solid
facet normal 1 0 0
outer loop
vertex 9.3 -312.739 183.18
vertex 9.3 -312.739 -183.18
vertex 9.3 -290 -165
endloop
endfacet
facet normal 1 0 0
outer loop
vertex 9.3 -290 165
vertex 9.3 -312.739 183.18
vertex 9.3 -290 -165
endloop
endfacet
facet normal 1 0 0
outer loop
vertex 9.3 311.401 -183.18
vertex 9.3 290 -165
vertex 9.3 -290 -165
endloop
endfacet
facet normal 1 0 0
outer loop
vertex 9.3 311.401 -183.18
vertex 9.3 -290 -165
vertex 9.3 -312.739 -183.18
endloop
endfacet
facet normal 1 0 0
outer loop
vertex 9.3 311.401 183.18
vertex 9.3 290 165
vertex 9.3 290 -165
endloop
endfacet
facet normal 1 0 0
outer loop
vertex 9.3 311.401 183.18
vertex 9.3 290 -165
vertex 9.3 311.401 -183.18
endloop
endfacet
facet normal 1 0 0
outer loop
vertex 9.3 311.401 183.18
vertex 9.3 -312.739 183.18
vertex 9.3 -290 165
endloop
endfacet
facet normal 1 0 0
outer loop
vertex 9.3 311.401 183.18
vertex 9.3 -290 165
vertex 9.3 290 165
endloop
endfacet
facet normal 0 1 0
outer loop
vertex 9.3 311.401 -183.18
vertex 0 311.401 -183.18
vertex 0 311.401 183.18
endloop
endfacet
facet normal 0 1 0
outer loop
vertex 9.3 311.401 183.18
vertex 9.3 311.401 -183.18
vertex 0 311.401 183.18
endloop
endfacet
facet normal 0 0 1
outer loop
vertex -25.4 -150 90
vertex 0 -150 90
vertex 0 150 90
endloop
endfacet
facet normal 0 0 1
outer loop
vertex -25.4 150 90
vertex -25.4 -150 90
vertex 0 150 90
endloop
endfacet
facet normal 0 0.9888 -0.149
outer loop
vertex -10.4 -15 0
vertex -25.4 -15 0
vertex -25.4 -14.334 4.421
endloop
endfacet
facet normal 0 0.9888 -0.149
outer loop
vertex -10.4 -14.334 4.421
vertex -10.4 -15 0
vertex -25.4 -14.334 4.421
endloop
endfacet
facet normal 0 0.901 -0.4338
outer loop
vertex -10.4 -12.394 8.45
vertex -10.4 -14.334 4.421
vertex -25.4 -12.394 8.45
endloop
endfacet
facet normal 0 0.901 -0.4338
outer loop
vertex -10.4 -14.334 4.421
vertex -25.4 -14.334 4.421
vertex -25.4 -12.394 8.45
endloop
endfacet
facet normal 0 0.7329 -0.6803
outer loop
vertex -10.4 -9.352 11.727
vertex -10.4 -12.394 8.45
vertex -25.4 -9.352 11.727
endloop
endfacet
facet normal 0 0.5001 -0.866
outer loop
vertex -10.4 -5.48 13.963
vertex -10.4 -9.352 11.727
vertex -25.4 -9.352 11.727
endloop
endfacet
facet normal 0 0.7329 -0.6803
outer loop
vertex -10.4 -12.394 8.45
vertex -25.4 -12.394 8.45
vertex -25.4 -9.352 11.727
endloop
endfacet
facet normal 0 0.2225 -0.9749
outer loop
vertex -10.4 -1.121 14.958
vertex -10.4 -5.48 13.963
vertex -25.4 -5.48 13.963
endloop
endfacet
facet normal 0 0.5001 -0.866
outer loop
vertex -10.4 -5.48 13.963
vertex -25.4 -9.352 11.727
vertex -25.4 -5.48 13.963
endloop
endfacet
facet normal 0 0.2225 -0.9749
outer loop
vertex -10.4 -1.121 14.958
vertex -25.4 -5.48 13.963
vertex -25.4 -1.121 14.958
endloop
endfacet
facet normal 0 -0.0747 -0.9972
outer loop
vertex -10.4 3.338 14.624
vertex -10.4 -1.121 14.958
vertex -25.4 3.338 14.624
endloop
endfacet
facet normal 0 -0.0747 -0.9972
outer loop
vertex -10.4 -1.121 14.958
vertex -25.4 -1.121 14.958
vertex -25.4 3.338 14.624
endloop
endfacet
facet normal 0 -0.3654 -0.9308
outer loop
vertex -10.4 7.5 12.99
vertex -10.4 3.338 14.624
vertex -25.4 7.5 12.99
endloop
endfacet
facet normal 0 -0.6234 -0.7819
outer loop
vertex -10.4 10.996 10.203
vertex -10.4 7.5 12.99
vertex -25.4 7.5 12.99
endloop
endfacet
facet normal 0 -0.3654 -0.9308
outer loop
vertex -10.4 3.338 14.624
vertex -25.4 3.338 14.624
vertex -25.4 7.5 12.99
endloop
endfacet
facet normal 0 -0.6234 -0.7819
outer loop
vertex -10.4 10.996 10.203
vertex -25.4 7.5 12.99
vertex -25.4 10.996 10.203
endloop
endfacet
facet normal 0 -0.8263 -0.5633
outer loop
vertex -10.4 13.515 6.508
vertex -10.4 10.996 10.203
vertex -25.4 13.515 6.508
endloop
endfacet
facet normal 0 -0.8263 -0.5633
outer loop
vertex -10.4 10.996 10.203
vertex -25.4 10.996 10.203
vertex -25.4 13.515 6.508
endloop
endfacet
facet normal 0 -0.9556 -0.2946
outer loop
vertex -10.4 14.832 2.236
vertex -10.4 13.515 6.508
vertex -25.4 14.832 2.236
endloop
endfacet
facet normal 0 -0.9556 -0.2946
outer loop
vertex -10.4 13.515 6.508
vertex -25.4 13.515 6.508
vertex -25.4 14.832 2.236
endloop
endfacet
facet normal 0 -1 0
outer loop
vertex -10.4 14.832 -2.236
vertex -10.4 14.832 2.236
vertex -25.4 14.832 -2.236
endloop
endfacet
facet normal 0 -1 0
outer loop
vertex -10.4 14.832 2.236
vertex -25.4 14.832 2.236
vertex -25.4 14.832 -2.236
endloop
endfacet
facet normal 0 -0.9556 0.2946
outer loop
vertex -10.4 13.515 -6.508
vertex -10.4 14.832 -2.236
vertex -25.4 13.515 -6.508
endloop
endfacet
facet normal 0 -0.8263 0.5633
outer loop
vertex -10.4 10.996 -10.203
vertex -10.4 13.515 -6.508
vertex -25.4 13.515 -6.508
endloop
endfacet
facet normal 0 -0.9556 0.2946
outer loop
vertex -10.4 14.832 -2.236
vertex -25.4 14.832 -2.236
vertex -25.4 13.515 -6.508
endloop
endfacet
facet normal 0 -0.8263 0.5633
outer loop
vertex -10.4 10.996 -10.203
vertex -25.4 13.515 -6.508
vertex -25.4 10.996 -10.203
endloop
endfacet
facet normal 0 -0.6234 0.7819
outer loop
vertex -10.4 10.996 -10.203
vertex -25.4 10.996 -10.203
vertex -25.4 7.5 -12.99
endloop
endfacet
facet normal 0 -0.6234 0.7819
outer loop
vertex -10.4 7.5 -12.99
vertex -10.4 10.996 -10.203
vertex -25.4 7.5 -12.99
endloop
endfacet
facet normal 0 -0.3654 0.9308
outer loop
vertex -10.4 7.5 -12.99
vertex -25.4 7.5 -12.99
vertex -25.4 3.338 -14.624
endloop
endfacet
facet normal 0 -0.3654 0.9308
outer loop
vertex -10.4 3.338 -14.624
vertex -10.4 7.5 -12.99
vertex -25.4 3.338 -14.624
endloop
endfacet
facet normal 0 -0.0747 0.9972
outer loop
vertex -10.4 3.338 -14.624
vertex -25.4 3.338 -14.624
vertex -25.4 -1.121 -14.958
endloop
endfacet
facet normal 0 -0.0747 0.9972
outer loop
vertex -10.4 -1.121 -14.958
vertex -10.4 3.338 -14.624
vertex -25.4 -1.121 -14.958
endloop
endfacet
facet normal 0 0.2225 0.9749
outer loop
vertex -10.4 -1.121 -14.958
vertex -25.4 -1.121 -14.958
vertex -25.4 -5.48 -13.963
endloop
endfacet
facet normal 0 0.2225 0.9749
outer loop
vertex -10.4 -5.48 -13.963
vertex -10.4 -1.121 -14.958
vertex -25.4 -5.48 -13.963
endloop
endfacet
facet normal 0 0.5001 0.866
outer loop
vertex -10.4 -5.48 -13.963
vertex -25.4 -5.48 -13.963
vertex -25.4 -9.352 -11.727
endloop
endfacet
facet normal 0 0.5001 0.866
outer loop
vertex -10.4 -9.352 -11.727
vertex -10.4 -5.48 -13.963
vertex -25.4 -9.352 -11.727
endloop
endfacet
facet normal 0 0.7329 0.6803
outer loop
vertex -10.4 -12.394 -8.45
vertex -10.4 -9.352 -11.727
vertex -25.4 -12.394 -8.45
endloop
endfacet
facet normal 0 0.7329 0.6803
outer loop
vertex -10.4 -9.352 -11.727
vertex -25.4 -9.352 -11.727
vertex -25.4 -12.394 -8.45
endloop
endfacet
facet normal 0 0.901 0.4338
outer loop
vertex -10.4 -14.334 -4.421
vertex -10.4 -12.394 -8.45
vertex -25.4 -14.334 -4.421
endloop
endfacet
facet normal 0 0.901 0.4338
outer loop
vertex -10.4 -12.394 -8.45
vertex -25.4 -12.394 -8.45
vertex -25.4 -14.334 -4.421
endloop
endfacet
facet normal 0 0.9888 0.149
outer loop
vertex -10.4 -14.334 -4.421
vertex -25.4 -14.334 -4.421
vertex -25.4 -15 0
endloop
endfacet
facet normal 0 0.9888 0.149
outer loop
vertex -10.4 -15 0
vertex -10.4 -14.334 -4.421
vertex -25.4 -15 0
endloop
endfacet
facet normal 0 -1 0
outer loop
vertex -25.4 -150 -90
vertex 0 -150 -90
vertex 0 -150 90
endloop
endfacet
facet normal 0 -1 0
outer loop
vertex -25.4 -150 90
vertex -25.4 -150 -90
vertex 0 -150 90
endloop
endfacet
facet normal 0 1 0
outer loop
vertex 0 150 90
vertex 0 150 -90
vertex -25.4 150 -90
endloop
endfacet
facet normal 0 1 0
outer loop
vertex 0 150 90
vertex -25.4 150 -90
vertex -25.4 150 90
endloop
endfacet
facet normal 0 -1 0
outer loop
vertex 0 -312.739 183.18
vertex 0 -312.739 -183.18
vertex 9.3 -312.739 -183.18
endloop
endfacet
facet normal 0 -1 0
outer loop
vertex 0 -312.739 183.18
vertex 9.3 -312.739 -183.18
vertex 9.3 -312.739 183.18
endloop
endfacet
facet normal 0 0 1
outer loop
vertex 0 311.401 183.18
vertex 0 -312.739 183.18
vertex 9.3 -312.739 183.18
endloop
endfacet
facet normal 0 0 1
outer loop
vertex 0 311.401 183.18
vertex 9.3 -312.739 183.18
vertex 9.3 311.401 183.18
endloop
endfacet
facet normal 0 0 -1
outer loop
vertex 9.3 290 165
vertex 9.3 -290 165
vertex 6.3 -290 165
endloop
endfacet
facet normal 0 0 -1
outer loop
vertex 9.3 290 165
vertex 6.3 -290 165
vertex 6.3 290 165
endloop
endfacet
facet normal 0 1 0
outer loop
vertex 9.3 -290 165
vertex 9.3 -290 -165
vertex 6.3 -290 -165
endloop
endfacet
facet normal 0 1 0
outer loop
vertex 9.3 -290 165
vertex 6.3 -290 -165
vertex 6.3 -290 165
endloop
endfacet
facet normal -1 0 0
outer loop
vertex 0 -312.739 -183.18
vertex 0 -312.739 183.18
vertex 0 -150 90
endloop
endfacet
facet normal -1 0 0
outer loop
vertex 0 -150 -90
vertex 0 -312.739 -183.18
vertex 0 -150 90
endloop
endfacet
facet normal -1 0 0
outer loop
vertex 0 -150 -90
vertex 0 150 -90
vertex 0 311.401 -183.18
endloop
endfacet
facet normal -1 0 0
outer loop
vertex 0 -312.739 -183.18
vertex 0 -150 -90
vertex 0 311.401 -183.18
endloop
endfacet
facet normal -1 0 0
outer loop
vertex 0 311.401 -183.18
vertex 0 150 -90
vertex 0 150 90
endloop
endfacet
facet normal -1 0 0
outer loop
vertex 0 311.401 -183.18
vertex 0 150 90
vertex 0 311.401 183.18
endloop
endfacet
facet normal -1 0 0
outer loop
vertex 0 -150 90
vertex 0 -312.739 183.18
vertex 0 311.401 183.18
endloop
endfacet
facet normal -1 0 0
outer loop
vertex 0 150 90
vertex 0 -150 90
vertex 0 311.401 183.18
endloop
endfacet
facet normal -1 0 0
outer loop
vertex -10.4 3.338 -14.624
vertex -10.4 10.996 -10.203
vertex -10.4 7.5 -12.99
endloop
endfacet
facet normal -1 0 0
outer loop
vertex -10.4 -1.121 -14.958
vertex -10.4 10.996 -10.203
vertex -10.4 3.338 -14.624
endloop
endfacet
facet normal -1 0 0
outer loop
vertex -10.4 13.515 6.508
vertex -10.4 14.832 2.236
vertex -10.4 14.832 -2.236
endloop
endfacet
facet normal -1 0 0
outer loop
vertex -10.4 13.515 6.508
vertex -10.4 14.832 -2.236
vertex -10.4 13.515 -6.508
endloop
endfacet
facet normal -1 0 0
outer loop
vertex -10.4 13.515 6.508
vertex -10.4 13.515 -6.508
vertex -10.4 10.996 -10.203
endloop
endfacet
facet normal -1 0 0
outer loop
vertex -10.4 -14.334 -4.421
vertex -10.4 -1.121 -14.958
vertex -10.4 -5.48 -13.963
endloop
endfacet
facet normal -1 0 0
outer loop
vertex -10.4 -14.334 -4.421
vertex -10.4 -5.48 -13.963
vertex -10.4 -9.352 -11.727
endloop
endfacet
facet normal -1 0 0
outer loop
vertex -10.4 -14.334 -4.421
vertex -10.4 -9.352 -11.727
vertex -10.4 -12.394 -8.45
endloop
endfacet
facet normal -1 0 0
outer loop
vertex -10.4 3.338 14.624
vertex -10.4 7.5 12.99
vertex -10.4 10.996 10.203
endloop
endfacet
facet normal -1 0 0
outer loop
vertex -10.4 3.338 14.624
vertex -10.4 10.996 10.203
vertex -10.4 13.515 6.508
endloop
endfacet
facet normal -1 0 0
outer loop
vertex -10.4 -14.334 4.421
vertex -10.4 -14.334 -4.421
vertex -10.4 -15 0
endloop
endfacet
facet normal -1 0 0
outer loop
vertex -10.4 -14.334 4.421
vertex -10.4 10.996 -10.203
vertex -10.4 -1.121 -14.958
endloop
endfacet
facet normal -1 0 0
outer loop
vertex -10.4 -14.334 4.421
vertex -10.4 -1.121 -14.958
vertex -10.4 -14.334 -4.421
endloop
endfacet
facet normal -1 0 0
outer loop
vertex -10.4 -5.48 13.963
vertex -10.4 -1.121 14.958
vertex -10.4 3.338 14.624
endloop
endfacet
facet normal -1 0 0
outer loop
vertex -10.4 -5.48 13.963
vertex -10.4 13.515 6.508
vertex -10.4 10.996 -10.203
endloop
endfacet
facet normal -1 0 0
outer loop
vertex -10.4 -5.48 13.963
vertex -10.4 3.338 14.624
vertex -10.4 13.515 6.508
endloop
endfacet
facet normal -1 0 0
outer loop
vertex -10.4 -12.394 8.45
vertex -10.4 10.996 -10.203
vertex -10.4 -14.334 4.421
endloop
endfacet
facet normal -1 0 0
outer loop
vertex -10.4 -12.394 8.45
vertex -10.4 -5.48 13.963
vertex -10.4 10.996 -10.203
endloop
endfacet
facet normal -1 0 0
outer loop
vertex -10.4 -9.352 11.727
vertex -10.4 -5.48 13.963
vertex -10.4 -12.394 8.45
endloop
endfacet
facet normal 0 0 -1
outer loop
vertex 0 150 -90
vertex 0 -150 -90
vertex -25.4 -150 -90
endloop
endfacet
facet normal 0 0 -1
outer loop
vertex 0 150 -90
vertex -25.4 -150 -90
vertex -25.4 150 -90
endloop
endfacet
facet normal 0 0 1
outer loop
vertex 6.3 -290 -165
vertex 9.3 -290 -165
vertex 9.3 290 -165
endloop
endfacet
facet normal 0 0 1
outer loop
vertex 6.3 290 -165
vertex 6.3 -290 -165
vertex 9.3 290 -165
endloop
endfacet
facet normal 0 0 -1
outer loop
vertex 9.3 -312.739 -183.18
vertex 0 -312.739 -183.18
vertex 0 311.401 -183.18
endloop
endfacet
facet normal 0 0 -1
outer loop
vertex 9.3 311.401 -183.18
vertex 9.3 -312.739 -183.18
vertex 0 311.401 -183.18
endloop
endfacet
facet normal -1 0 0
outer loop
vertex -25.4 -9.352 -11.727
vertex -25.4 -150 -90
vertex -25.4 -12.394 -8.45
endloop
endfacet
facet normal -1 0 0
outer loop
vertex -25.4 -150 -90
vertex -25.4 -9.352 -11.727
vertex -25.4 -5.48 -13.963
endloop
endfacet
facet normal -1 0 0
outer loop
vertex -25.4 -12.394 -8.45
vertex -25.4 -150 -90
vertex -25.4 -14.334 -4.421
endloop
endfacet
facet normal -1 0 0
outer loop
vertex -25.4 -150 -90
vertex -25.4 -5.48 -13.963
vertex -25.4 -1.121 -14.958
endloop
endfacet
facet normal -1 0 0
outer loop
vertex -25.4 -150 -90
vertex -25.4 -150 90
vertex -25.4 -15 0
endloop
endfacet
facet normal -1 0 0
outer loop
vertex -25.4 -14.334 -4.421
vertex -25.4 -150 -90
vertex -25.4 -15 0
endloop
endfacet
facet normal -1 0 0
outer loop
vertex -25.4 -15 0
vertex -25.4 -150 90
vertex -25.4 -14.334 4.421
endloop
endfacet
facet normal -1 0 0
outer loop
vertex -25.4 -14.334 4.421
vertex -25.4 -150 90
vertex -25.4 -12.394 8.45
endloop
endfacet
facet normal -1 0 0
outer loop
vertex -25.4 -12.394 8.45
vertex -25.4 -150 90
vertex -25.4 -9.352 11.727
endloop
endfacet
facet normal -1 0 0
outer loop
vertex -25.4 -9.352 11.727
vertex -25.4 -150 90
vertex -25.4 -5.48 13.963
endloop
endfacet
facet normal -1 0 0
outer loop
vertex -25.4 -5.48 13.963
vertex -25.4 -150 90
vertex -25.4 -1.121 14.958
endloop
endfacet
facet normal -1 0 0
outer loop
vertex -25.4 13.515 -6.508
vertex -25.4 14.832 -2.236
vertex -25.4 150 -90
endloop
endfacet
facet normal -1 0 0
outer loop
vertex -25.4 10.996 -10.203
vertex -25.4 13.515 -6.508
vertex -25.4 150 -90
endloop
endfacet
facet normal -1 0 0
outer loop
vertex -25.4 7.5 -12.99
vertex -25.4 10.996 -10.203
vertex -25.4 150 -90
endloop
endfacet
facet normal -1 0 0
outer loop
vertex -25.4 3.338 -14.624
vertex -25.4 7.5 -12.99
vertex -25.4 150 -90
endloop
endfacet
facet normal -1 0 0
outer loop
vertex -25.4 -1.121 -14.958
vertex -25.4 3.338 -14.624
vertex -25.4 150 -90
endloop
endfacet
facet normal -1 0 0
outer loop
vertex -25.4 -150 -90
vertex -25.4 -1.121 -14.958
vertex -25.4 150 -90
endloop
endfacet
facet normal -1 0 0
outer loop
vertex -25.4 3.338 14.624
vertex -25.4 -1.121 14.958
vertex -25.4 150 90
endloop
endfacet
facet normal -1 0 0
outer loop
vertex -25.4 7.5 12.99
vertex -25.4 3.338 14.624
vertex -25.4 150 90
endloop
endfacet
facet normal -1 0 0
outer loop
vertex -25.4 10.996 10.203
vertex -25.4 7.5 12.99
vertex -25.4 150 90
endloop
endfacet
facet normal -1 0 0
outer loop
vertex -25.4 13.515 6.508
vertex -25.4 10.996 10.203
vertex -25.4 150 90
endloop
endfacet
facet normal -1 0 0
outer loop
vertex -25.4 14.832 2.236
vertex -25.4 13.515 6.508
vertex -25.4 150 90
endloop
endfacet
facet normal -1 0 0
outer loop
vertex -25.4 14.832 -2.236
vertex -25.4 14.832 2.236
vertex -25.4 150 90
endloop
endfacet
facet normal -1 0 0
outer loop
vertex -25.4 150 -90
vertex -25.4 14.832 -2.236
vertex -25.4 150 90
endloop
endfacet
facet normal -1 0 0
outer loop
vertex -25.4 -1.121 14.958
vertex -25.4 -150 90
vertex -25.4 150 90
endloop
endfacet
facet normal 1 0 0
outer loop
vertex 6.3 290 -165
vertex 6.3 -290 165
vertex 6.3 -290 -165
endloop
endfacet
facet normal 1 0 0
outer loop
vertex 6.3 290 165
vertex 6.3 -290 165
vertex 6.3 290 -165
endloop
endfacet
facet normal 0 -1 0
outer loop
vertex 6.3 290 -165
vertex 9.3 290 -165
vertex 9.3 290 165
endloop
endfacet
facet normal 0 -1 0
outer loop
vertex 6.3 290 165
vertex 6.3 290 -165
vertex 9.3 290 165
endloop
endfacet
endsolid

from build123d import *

# Parameters (mm, degrees)
F0_W     = 624.14
F0_H     = 366.36
F1_DEPTH = 9.3
F2_W     = 580
F2_H     = 330
F3_DEPTH = 3
F4_W     = 300
F4_H     = 180
F5_DEPTH = 25.4
F6_R     = 15
F7_DEPTH = 15


with BuildPart() as f1:
    # F0 (on Right) → F1 (new body)
    with BuildSketch(Plane.YZ):
        with Locations((-0.668731, 0)):
            Rectangle(F0_W, F0_H)
    extrude(amount=F1_DEPTH)

    # F2 (on face) → F3 (cut)
    with BuildSketch(Plane.YZ.offset(9.3)):
        Rectangle(F2_W, F2_H)
    extrude(amount=-F3_DEPTH, mode=Mode.SUBTRACT)

    # F4 (on Right) → F5 (join)
    with BuildSketch(Plane.YZ):
        Rectangle(F4_W, F4_H)
    extrude(amount=-F5_DEPTH)

    # F6 (on face) → F7 (cut)
    with BuildSketch(Plane(origin=(-25.4, 0, 0), x_dir=(0, -1, 0), z_dir=(-1, 0, 0))):
        Circle(F6_R)
    extrude(amount=-F7_DEPTH, mode=Mode.SUBTRACT)


solid = f1.part
